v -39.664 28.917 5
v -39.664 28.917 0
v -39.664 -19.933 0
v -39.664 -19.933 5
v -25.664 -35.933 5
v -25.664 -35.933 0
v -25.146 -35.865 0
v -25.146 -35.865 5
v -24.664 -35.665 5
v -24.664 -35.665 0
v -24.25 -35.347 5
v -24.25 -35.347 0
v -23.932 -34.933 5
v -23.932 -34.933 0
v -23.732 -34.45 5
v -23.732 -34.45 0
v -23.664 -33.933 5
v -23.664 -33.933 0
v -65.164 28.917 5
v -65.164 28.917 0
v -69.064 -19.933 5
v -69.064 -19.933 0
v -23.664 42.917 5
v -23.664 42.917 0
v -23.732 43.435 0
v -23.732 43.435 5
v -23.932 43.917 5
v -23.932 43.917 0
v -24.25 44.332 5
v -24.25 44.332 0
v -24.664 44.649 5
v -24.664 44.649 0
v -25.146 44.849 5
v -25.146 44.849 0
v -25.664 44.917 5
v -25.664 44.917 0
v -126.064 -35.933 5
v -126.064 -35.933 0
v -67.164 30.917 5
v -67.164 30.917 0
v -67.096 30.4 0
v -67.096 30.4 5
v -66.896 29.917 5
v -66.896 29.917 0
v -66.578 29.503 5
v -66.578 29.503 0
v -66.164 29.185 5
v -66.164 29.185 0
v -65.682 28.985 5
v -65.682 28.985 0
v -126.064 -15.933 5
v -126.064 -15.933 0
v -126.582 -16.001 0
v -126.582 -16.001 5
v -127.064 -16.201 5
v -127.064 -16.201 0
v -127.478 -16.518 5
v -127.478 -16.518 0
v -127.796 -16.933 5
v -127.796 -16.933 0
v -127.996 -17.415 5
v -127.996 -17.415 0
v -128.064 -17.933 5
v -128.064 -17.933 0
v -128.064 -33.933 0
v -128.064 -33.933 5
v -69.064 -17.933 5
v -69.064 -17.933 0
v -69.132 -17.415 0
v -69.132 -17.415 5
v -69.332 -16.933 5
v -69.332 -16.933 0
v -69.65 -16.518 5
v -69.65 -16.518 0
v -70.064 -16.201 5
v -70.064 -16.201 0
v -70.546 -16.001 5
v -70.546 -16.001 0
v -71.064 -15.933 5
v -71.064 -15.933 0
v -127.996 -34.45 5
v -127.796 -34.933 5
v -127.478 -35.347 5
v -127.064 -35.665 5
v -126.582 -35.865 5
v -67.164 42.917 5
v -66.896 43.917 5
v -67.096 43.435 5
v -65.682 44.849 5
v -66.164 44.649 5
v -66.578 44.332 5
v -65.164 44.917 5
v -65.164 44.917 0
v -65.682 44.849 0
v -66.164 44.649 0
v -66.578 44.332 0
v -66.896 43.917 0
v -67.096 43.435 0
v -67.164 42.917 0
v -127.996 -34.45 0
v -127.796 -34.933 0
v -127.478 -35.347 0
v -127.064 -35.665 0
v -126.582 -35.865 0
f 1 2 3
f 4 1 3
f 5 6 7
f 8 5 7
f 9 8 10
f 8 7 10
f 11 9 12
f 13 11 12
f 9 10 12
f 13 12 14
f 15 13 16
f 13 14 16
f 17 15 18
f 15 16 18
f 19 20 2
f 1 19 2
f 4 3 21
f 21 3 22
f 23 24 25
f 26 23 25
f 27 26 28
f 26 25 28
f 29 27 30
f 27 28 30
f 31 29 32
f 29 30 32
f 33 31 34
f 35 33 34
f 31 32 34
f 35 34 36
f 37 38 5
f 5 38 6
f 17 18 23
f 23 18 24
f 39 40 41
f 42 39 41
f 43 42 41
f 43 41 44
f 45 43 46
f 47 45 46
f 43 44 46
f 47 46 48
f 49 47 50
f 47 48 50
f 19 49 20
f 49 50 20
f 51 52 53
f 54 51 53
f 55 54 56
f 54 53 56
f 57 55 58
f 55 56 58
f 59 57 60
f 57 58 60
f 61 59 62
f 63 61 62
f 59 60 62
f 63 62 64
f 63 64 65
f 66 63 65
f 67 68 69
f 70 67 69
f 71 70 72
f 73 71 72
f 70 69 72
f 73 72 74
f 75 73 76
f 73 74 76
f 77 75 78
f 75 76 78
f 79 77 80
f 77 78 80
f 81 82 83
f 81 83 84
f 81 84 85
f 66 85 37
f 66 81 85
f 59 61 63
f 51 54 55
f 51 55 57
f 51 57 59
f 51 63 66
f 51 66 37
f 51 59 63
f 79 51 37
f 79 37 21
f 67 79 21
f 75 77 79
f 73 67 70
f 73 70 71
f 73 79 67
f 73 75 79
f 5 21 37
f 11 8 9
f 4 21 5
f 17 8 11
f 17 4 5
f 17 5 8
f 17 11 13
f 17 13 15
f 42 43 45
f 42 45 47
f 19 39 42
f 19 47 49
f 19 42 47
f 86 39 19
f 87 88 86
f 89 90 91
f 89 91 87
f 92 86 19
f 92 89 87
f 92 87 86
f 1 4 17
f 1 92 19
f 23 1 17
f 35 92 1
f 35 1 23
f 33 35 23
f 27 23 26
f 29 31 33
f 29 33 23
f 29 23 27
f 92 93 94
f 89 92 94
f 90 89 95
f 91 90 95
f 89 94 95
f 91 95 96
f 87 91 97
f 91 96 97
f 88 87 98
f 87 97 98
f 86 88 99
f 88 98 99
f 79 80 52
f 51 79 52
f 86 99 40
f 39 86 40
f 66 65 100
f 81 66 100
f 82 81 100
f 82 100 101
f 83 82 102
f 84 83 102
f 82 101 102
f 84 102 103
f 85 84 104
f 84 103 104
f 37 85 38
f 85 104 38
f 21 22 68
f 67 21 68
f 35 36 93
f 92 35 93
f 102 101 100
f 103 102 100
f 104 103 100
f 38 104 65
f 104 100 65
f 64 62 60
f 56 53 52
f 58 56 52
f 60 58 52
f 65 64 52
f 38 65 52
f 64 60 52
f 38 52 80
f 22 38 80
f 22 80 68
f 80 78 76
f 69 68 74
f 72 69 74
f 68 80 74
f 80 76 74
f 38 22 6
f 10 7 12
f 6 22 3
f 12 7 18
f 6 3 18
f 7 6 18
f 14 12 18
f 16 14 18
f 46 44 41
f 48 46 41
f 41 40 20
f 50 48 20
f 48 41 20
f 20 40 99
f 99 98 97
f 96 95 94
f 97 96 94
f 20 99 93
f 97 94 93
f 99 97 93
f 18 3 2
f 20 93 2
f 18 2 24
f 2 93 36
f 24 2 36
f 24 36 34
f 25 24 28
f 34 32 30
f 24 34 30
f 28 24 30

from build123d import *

# Parameters (mm, degrees)
F1_DEPTH = 5


with BuildPart() as f1:
    # F0 (on Top) → F1 (new body)
    with BuildSketch(Plane.XY):
        with BuildLine():
            ThreePointArc((-67.163906, 30.917319), (-66.578119, 29.503106), (-65.163906, 28.917319))
            Line((-65.163906, 28.917319), (-39.663906, 28.917319))
            Line((-39.663906, 28.917319), (-39.663906, -19.932681))
            Line((-39.663906, -19.932681), (-69.063906, -19.932681))
            Line((-69.063906, -19.932681), (-69.063906, -17.932681))
            ThreePointArc((-69.063906, -17.932681), (-69.649692, -16.518467), (-71.063906, -15.932681))
            Line((-71.063906, -15.932681), (-88.063906, -15.932681))
            Line((-88.063906, -15.932681), (-126.063906, -15.932681))
            ThreePointArc((-126.063906, -15.932681), (-127.478119, -16.518467), (-128.063906, -17.932681))
            Line((-128.063906, -17.932681), (-128.063906, -33.932681))
            ThreePointArc((-128.063906, -33.932681), (-127.478119, -35.346894), (-126.063906, -35.932681))
            Line((-126.063906, -35.932681), (-39.663906, -35.932681))
            Line((-39.663906, -35.932681), (-25.663906, -35.932681))
            ThreePointArc((-25.663906, -35.932681), (-24.249692, -35.346894), (-23.663906, -33.932681))
            Line((-23.663906, -33.932681), (-23.663906, -19.932681))
            Line((-23.663906, -19.932681), (-23.663906, 28.917319))
            Line((-23.663906, 28.917319), (-23.663906, 42.917319))
            ThreePointArc((-23.663906, 42.917319), (-24.249692, 44.331533), (-25.663906, 44.917319))
            Line((-25.663906, 44.917319), (-65.163906, 44.917319))
            ThreePointArc((-65.163906, 44.917319), (-66.578119, 44.331533), (-67.163906, 42.917319))
            Line((-67.163906, 42.917319), (-67.163906, 30.917319))
        make_face()
    extrude(amount=F1_DEPTH)


solid = f1.part
